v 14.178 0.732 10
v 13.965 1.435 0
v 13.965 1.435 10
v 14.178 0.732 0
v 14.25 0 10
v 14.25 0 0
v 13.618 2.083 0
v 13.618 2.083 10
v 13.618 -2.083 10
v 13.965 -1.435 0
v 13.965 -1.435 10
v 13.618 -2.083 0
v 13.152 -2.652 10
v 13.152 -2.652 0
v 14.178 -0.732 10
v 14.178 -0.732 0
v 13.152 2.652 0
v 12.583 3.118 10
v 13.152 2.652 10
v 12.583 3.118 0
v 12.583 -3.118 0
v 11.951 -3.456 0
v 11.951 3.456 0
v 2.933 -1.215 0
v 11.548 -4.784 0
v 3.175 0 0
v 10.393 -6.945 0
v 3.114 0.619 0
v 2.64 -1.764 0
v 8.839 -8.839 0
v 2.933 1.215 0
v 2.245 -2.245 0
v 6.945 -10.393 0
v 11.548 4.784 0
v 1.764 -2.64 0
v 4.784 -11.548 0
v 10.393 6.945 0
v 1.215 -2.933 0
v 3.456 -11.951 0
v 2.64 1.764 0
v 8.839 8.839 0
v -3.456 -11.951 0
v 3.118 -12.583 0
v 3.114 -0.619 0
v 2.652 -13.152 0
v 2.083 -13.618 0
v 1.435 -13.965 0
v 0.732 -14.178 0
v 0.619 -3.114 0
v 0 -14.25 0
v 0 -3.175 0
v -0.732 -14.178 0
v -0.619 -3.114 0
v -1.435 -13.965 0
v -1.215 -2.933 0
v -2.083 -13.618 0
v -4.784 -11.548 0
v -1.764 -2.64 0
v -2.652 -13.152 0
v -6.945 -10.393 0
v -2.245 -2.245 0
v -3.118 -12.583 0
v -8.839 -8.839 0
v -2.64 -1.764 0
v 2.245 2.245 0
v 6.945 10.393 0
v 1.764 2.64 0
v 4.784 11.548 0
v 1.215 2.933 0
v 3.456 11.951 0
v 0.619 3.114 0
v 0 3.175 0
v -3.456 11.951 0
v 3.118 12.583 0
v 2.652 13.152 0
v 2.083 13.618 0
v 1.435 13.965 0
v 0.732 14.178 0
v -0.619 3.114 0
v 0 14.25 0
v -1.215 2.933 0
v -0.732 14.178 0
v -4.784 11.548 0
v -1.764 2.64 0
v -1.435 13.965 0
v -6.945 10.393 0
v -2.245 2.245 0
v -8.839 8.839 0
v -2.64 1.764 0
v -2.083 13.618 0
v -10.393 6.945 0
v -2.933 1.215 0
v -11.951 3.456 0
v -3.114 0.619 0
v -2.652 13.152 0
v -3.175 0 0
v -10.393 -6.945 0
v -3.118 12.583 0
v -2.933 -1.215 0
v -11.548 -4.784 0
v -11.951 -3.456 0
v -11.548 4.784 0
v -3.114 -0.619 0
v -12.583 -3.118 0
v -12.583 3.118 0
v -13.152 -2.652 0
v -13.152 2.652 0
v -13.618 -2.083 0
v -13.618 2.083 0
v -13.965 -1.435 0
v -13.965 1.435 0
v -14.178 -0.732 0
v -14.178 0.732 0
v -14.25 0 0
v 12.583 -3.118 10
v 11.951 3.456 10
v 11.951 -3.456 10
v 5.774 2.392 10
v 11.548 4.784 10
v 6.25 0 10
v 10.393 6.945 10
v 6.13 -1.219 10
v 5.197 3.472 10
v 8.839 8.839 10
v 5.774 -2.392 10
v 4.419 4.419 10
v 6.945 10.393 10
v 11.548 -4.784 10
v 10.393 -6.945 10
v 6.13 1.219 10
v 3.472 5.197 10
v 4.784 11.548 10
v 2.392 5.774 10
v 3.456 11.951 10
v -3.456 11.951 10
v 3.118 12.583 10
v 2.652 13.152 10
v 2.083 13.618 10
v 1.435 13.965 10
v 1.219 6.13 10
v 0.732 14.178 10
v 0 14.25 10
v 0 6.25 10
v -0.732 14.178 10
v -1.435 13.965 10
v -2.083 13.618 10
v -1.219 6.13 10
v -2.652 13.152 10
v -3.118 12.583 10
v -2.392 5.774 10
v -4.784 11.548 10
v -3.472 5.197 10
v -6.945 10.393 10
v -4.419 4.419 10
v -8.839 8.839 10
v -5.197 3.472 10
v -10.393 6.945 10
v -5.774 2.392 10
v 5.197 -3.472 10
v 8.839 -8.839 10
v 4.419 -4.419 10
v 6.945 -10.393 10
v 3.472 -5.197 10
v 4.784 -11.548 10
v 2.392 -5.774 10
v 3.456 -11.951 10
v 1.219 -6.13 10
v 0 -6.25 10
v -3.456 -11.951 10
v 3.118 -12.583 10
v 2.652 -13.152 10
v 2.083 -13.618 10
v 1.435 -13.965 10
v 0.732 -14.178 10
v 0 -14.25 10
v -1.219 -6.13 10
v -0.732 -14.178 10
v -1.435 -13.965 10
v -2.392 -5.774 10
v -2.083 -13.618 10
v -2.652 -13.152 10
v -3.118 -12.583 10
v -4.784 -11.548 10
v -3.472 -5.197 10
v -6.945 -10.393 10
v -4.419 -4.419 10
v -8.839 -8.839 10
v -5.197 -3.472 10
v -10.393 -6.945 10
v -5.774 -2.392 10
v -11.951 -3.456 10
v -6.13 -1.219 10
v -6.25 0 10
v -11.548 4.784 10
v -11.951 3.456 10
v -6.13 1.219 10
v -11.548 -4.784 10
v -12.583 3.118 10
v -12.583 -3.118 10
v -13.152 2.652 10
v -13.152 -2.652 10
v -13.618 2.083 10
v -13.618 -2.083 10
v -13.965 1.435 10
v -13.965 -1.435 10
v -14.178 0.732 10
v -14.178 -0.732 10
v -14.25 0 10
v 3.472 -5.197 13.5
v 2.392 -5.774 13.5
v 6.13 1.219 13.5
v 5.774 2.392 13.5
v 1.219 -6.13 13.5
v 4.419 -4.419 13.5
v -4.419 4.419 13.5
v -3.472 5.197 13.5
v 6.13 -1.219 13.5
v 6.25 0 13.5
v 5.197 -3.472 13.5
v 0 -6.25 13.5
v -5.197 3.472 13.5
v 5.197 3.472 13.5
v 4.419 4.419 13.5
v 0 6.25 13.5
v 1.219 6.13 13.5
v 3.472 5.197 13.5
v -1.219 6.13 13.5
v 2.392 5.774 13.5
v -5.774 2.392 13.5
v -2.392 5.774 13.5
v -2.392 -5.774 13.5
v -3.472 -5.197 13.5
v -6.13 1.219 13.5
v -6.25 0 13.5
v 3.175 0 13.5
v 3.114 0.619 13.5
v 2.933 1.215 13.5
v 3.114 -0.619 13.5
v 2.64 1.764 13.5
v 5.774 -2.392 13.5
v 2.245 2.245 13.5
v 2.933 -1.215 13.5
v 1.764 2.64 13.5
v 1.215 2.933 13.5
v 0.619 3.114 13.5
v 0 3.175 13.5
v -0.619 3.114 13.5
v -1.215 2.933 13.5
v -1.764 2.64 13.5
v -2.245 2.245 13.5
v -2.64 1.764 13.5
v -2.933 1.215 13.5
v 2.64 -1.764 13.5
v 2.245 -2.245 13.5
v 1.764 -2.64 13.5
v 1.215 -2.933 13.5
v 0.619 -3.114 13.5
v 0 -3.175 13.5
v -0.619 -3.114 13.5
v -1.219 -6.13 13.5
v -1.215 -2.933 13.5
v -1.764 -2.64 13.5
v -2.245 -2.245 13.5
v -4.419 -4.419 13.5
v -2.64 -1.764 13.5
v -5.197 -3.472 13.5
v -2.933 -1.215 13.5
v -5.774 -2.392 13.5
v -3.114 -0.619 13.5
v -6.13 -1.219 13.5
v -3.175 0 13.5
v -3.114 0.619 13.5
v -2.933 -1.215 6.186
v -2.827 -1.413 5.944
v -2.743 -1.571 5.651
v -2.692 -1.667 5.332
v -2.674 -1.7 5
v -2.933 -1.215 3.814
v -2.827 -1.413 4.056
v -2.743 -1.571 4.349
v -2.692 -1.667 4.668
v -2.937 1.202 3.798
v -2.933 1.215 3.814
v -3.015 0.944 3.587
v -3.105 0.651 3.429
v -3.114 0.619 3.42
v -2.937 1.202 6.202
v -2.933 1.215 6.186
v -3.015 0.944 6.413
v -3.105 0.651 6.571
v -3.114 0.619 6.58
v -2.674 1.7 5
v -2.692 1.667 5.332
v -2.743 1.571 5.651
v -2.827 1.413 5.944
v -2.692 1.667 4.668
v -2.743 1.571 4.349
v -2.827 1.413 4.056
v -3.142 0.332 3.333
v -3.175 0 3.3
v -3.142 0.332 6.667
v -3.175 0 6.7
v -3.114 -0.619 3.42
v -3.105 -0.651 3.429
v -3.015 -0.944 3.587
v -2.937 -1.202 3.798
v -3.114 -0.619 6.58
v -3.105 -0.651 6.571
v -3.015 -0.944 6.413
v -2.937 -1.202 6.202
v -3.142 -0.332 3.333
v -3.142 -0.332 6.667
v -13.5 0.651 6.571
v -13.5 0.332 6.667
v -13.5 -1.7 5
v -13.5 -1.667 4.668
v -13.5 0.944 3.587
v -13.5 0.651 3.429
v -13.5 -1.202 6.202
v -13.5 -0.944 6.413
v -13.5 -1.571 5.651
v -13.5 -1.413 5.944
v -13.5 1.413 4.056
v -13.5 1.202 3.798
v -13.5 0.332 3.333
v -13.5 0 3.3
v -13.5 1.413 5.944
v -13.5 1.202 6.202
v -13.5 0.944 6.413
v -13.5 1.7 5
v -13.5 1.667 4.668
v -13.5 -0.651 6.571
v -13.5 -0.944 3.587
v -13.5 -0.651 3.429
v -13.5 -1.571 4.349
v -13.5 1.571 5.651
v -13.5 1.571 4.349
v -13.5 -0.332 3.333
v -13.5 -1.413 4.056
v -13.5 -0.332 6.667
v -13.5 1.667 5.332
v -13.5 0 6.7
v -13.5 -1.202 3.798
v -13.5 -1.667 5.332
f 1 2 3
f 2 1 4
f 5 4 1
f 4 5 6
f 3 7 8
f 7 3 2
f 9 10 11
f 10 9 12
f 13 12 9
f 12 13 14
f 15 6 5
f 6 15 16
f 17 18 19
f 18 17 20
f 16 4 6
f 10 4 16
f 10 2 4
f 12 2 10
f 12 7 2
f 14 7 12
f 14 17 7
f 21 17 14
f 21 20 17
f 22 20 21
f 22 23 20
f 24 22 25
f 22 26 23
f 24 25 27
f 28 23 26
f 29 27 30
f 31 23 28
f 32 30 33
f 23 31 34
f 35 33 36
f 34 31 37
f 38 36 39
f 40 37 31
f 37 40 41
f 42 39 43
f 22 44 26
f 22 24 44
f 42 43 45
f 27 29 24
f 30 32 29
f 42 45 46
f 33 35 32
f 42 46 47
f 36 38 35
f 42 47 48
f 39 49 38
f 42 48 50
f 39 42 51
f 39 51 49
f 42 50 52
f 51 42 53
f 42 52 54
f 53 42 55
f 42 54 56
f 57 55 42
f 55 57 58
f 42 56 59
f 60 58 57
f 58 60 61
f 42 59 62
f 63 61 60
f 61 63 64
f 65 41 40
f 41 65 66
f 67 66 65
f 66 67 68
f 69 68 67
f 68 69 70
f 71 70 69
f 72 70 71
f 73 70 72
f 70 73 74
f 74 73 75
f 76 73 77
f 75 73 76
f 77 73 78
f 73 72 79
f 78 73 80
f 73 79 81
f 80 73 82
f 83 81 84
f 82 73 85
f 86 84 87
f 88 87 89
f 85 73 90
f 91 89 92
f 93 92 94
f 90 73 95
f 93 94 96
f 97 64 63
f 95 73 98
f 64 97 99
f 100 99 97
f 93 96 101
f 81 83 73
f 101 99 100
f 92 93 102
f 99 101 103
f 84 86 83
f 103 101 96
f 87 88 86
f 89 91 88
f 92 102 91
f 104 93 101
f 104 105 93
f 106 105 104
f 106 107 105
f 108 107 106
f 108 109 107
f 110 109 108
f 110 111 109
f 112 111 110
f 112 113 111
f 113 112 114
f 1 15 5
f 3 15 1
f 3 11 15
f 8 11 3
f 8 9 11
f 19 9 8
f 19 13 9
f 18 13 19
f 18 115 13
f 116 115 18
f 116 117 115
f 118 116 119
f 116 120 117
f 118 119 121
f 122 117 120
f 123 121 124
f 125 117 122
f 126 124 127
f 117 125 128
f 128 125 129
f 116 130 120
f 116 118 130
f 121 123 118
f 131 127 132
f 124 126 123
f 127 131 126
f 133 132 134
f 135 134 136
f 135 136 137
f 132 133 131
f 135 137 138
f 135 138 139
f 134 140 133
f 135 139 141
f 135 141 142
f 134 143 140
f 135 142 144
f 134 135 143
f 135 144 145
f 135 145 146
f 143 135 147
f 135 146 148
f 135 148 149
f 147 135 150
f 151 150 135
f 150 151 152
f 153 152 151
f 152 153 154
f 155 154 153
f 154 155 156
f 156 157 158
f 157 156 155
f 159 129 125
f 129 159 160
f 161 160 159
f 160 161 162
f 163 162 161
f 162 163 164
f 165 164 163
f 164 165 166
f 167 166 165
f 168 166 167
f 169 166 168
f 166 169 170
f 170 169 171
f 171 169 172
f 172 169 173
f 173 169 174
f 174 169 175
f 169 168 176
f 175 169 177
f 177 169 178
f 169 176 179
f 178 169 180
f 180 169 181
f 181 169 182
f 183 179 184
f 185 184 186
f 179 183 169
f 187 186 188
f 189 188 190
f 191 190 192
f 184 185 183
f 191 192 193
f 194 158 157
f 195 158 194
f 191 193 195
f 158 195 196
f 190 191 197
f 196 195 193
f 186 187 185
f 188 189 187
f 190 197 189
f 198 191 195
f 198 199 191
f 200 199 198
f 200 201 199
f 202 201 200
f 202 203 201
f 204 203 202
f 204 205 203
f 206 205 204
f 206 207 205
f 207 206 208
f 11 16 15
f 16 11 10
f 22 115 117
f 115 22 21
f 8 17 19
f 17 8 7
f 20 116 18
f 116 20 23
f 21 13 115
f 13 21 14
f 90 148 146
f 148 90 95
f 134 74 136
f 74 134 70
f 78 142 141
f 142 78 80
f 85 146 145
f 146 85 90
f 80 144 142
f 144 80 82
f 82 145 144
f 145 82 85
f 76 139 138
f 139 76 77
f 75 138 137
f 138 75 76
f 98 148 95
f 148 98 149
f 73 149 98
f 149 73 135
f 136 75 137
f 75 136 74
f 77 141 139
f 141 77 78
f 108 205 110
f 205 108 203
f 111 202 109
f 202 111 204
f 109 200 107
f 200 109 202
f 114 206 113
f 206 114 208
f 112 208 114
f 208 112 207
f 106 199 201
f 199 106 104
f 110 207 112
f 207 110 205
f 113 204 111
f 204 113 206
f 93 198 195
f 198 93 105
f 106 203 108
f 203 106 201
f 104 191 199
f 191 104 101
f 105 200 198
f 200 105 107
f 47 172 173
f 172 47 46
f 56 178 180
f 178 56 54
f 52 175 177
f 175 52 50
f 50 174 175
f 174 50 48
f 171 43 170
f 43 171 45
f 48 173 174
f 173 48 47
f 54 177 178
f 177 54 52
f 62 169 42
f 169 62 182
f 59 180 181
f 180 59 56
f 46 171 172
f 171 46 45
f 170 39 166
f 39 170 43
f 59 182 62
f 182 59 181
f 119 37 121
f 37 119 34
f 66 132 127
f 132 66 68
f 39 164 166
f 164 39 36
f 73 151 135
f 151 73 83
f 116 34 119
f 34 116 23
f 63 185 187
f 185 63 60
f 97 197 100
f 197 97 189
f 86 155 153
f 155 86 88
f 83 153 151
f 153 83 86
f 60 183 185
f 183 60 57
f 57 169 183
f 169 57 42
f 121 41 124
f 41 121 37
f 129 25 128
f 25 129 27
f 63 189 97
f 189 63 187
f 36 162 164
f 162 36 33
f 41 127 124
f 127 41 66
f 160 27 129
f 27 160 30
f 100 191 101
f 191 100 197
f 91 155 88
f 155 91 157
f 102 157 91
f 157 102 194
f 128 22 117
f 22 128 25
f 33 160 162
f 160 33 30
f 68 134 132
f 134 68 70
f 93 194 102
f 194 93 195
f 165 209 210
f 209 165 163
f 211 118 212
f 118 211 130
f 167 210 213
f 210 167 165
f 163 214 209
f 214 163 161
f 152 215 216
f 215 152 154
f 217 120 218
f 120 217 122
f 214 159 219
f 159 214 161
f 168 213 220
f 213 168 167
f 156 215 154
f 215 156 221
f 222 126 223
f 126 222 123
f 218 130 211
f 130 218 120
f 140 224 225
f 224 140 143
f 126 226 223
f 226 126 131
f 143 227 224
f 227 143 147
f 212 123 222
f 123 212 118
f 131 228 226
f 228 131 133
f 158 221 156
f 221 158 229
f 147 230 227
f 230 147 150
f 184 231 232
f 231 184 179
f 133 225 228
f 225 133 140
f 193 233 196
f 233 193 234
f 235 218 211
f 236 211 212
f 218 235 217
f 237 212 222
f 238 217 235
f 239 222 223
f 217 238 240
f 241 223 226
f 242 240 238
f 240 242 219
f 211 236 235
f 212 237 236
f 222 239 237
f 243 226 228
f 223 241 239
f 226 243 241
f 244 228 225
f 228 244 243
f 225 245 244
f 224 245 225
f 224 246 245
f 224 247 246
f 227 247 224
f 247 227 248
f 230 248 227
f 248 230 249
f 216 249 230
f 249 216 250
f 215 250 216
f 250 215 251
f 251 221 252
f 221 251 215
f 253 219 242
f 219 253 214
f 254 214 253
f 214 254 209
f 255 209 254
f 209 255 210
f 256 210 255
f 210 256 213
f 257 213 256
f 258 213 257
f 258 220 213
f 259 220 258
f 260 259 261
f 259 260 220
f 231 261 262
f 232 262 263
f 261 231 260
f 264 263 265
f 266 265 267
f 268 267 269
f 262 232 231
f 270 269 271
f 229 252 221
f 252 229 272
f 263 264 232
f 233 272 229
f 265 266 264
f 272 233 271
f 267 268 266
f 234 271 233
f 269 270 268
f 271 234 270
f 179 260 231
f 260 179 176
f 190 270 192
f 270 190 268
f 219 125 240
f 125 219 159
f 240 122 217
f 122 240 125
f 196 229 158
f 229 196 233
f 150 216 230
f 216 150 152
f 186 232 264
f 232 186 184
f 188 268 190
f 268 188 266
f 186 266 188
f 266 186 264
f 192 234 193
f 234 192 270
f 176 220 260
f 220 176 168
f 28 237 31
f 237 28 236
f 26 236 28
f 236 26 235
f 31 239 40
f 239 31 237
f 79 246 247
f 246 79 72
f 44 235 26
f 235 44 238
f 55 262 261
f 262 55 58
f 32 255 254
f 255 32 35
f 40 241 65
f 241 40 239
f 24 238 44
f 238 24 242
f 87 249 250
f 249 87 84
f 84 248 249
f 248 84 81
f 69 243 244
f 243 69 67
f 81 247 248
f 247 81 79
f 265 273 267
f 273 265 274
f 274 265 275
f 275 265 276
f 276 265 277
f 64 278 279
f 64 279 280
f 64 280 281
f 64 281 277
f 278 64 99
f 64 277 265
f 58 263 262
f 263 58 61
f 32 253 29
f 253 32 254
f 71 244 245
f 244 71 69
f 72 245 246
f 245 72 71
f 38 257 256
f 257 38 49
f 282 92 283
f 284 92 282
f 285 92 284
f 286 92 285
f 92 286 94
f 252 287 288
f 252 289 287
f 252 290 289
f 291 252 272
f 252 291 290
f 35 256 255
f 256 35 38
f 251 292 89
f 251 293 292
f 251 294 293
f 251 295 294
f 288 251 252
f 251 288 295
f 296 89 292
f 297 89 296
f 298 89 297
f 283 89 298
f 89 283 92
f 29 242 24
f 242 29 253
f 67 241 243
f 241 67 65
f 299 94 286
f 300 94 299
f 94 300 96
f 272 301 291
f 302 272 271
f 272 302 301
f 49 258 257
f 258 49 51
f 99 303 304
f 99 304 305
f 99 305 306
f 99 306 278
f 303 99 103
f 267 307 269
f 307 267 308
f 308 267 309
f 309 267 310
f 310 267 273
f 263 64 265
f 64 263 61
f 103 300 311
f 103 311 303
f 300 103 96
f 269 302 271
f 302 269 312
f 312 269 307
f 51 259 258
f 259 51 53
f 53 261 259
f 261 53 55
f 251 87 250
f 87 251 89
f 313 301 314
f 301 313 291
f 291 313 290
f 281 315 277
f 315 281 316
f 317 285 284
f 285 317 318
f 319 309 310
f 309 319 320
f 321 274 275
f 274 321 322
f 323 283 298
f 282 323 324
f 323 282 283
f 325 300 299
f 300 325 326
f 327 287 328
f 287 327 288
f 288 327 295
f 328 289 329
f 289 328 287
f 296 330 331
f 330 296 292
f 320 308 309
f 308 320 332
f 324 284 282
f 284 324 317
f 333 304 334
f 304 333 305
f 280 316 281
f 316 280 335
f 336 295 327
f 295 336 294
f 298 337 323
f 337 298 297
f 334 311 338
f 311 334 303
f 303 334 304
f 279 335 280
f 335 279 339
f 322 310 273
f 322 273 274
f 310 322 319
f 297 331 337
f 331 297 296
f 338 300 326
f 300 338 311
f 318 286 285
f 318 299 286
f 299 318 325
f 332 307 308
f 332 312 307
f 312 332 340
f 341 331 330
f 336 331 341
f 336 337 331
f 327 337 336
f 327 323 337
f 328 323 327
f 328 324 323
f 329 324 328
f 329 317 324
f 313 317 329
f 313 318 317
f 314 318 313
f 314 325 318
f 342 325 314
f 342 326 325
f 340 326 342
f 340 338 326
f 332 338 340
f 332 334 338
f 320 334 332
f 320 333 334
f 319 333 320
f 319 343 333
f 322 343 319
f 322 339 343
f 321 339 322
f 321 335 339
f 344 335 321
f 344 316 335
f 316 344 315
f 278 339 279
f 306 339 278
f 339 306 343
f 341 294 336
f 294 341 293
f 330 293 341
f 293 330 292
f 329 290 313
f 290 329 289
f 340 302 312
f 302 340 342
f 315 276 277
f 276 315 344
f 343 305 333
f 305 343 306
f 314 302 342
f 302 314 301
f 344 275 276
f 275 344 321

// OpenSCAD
$fn = 32;

// ----------------------------------------------------------------------
// Hand knob: 25 x 25 x 13.5 mm
// ----------------------------------------------------------------------

// --- parameters (mm) ---
knob_d = 25;              // knob diameter
knob_h = 10;              // knob height
bore_d = 6.35;            // shaft bore
set_d = 3.4;              // set screw tap hole
knurl_d = 0.52;           // knurl groove diameter
lobes = 4;                // grip lobes
cap_h = 3.5;              // raised centre cap
cap_d = 12.5;             // centre cap diameter

module body() {
  cylinder(h = knob_h, d = knob_d);
  for (i = [0 : lobes - 1])
    rotate([0, 0, i * 360 / lobes])
      translate([knob_d * 0.42, 0, 0])
        cylinder(h = knob_h, d = knob_d * 0.3);
}

module cap() {
  translate([0, 0, knob_h - 1]) cylinder(h = cap_h + 1, d = cap_d);
}

difference() {
  union() {
    body();
    cap();
  }
  translate([0, 0, -1]) cylinder(h = knob_h + cap_h + 2, d = bore_d);
  translate([-knob_d / 2 - 1, 0, knob_h * 0.5]) rotate([0, 90, 0]) cylinder(h = knob_d / 2 + 2, d = set_d);
}
